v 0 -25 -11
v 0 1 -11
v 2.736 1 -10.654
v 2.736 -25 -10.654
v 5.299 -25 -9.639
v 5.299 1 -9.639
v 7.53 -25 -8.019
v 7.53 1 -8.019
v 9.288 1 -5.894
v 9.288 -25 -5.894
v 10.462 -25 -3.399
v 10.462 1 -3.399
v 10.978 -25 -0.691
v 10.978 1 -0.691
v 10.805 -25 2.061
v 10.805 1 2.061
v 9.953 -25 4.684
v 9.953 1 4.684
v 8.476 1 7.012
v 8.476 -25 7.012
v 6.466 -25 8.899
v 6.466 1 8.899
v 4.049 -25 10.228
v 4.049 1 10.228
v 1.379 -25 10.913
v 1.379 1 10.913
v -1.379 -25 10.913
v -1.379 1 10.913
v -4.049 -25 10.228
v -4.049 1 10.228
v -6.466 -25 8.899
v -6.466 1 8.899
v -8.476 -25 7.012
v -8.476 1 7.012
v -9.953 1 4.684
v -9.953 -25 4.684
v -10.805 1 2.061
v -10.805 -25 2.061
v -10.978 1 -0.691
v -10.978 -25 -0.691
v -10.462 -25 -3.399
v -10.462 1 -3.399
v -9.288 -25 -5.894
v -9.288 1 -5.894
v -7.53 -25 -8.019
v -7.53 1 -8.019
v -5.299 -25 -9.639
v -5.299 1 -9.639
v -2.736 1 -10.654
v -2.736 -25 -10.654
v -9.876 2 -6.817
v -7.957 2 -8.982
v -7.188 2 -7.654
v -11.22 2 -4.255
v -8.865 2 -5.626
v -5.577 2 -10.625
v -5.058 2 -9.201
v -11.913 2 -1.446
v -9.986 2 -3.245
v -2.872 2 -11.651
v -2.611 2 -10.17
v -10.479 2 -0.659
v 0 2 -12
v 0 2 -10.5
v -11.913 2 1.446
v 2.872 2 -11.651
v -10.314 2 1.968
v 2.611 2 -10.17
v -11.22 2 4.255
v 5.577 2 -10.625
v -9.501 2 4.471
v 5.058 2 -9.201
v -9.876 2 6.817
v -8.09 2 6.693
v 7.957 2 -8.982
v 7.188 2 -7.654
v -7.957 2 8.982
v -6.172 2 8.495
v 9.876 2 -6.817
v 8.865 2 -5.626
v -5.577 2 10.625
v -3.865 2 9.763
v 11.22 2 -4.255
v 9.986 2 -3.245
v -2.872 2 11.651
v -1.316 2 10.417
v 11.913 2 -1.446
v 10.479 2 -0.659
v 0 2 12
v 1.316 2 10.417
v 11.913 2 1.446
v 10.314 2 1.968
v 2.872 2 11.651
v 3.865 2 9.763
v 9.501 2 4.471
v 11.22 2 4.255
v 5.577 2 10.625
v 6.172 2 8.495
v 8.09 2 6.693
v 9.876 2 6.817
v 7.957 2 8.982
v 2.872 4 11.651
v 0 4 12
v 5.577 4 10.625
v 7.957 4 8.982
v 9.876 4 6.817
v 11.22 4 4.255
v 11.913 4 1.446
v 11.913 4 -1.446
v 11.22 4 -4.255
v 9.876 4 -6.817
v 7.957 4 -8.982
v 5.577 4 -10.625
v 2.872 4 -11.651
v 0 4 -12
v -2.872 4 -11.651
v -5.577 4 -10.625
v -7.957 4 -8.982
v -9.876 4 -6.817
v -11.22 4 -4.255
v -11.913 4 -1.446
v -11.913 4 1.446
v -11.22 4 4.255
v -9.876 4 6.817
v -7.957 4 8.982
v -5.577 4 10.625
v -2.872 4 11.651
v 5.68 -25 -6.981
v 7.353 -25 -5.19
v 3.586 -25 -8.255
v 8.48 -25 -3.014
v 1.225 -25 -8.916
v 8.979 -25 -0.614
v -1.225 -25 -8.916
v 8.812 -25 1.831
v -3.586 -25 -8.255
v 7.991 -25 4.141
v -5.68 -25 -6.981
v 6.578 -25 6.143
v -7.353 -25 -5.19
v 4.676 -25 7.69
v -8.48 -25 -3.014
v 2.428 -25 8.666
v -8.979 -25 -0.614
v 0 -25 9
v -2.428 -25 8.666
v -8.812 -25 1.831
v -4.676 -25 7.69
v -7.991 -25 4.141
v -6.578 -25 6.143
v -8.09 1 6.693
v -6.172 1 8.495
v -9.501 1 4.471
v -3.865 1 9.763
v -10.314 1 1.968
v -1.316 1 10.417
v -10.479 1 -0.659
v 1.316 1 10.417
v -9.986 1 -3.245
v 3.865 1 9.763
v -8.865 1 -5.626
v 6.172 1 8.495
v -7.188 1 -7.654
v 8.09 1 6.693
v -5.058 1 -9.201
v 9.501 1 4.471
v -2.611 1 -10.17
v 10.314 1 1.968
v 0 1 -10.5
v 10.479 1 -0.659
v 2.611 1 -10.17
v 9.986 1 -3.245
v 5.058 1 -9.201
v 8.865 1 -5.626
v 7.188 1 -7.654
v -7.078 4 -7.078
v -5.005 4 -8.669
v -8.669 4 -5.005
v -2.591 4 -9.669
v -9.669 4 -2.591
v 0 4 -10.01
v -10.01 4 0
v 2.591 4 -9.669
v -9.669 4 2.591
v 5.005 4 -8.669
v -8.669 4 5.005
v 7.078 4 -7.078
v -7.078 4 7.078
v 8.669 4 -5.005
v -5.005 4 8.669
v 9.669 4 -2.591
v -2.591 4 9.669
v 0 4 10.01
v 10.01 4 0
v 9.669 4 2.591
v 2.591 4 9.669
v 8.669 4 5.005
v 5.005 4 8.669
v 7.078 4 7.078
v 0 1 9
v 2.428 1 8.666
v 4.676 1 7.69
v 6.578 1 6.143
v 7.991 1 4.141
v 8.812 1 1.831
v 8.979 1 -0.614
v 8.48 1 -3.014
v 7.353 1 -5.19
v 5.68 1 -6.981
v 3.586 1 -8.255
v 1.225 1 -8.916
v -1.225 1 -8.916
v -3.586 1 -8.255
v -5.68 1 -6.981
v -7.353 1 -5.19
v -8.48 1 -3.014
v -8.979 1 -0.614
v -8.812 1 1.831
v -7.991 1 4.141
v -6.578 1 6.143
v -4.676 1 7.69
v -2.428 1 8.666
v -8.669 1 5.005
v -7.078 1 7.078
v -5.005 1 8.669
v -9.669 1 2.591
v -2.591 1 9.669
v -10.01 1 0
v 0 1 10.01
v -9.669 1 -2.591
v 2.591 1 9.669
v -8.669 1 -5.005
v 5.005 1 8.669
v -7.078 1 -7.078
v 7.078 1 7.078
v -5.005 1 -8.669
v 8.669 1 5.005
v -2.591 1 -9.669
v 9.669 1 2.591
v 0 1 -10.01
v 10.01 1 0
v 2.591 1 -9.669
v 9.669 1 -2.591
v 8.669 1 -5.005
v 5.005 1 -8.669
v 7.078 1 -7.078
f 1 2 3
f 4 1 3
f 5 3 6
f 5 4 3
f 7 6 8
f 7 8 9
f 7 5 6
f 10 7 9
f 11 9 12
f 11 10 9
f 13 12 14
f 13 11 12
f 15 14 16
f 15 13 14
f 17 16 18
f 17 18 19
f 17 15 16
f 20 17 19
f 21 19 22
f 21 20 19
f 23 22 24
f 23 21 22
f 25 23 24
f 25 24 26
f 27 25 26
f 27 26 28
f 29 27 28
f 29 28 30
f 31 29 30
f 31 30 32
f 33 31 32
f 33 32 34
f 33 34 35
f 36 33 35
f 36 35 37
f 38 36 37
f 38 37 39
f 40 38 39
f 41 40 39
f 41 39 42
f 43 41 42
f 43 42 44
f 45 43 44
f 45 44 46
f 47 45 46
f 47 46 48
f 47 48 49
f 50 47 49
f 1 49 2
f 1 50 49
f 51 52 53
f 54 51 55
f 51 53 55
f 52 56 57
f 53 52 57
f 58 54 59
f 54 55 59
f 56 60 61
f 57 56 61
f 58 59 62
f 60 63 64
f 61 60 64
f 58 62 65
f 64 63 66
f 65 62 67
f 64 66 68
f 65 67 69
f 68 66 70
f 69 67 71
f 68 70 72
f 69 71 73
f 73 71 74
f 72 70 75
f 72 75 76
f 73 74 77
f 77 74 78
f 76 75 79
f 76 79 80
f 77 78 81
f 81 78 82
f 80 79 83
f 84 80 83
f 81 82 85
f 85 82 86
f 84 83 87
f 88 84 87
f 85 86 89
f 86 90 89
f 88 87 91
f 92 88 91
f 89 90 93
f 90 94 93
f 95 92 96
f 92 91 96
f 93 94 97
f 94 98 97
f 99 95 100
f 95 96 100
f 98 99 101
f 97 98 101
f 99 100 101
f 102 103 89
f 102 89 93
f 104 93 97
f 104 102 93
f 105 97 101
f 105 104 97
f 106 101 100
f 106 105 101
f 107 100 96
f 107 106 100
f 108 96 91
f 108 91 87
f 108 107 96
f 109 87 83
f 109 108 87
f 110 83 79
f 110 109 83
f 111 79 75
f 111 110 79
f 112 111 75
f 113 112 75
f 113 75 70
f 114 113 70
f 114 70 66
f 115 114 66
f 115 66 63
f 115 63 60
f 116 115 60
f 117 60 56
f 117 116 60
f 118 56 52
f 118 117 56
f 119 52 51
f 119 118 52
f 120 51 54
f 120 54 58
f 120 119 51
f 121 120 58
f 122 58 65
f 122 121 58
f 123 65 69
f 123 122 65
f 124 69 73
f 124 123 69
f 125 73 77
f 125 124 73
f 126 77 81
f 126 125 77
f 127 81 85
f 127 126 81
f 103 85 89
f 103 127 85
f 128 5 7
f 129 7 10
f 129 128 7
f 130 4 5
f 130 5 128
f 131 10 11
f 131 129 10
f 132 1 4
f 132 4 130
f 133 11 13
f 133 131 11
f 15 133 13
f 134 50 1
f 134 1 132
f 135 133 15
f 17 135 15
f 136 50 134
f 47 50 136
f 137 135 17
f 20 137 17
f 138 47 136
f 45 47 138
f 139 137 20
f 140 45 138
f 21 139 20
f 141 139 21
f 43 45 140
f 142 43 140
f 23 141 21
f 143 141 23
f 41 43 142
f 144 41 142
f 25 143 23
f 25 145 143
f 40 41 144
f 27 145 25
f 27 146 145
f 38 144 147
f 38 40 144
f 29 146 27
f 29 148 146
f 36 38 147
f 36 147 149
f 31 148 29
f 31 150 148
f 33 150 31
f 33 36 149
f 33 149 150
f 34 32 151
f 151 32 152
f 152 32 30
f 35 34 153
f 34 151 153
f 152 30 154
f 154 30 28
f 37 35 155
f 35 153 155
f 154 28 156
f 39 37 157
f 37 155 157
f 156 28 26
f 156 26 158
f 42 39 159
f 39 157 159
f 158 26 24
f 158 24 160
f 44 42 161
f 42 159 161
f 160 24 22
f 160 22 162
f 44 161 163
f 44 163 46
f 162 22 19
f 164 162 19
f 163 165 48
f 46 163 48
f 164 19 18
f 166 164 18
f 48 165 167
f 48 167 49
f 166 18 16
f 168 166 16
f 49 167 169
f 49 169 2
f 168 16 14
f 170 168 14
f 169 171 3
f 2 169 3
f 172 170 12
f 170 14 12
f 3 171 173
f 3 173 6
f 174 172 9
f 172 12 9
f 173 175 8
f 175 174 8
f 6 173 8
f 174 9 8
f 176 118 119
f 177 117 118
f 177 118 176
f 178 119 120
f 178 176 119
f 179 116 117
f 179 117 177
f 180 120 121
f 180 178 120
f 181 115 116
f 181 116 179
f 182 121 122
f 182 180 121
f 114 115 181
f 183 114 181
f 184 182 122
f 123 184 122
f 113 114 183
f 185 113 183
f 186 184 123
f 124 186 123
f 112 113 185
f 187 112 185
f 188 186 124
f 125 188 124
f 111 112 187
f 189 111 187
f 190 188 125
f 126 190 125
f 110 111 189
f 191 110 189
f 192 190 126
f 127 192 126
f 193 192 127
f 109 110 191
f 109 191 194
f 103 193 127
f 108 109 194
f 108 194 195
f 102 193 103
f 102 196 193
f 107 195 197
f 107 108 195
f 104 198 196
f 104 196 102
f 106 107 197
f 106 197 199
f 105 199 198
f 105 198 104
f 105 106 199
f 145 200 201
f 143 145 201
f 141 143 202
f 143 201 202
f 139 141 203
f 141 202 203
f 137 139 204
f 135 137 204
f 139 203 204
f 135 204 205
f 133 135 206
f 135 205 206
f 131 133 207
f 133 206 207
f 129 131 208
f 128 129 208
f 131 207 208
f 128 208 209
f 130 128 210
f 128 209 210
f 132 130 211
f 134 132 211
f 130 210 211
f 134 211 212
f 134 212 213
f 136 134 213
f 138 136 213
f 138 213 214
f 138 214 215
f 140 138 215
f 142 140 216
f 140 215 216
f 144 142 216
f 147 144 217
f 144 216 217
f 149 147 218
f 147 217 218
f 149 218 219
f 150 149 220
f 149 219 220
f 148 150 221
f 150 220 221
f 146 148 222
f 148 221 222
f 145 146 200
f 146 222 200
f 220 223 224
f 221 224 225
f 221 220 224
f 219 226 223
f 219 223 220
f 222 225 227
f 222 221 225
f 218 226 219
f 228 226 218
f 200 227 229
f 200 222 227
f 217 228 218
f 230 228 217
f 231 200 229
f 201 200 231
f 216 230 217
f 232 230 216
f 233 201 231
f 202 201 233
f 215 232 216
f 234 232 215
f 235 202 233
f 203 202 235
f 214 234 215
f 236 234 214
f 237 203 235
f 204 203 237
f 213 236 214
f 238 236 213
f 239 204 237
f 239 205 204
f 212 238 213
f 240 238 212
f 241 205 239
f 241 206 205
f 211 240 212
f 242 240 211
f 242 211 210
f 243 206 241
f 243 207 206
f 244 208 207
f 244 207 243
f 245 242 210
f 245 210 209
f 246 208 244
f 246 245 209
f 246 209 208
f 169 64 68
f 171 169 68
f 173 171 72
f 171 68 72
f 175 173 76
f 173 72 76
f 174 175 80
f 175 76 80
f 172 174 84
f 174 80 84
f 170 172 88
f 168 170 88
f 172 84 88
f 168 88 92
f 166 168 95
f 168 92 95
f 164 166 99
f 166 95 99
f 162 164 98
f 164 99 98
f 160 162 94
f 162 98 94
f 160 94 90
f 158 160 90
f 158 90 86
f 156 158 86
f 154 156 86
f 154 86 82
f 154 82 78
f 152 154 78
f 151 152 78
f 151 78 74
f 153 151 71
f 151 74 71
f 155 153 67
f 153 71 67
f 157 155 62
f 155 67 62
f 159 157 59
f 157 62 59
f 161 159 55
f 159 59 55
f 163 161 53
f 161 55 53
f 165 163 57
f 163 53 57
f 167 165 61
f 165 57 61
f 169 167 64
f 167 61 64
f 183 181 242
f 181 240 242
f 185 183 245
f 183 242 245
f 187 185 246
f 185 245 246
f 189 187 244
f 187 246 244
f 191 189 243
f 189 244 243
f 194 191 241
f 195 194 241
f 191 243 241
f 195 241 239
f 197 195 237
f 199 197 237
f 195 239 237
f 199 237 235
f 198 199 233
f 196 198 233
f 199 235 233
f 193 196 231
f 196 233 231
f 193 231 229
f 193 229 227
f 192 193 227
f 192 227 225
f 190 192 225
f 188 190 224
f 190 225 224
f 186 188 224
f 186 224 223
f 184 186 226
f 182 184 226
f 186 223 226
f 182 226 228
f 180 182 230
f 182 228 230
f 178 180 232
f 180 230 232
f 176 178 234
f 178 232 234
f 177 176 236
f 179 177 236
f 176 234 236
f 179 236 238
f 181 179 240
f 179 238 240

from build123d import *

# Parameters (mm, degrees)
SKETCH_2_R           = 10.01
SKETCH_2_R_2         = 9
EXTRUDE_2_DEPTH      = 25
EXTRUDE_START        = 2
SKETCH_3_R           = 10.01
EXTRUDE_3_DEPTH      = 2
SKETCH_4_R           = 9
CUT_EXTRUDE_1_DEPTH  = 1
SKETCH_6_R           = 8
CUT_EXTRUDE_3_DEPTH  = 3
SKETCH_7_R           = 11
SKETCH_7_R_2         = 10
EXTRUDE_4_DEPTH      = 4
SKETCH_8_R           = 9
SKETCH_8_R_2         = 8
EXTRUDE_5_DEPTH      = 25
SKETCH_10_R          = 10.01
SKETCH_10_R_2        = 9.5
CUT_EXTRUDE_5_DEPTH  = 1
CUT_EXTRUDE_START    = 10
SKETCH_11_R          = 10.01
CUT_EXTRUDE_6_DEPTH  = 10
SKETCH_12_R          = 11
SKETCH_12_R_2        = 10.01
EXTRUDE_6_DEPTH      = 26
SKETCH_13_R          = 9
CUT_EXTRUDE_7_DEPTH  = 26
SKETCH_14_R          = 10.005206388
SKETCH_14_R_2        = 9.5
EXTRUDE_7_DEPTH      = 26
SKETCH_16_R          = 11
SKETCH_16_R_2        = 10.5
CUT_EXTRUDE_12_DEPTH = 1
SKETCH_17_R          = 13.732639959
CUT_EXTRUDE_13_DEPTH = 1
SKETCH_19_R          = 10.229377856
SKETCH_19_R_2        = 10.005206388
EXTRUDE_10_DEPTH     = 10
SKETCH_20_R          = 12
SKETCH_20_R_2        = 11
EXTRUDE_11_DEPTH     = 2


with BuildPart() as part:
    # Эскиз2 → Бобышка-Вытянуть2 (new body)
    with BuildSketch(Plane.XZ):
        with Locations(Location((0, 0, 0), (0, 0, 270))):
            Circle(SKETCH_2_R)
        with Locations(Location((0, 0, 0), (0, 0, 270))):
            Circle(SKETCH_2_R_2, mode=Mode.SUBTRACT)
    extrude(amount=EXTRUDE_2_DEPTH)

    # Эскиз3 → Бобышка-Вытянуть3 (add)
    with BuildSketch(Plane(origin=(0, 0, 0), x_dir=(1, 0, 0), z_dir=(0, 1, 0)).offset(EXTRUDE_START)):
        with Locations(Location((0, 0, 0), (0, 0, 270))):
            Circle(SKETCH_3_R)
    extrude(amount=-EXTRUDE_3_DEPTH)

    # Эскиз4 → Вырез-Вытянуть1 (cut)
    with BuildSketch(Plane(origin=(0, 2, 0), x_dir=(1, 0, 0), z_dir=(0, 1, 0))):
        with Locations(Location((0, 0, 0), (0, 0, 90))):
            Circle(SKETCH_4_R)
    extrude(amount=-CUT_EXTRUDE_1_DEPTH, mode=Mode.SUBTRACT)

    # Эскиз6 → Вырез-Вытянуть3 (cut)
    with BuildSketch(Plane(origin=(0, 1, 0), x_dir=(1, 0, 0), z_dir=(0, 1, 0))):
        with Locations(Location((0, 0, 0), (0, 0, 270))):
            Circle(SKETCH_6_R)
    extrude(amount=-CUT_EXTRUDE_3_DEPTH, mode=Mode.SUBTRACT)

    # Эскиз7 → Бобышка-Вытянуть4 (add)
    with BuildSketch(Plane(origin=(0, 1, 0), x_dir=(1, 0, 0), z_dir=(0, 1, 0))):
        with Locations(Location((0, 0, 0), (0, 0, 270))):
            Circle(SKETCH_7_R)
        with Locations(Location((0, 0, 0), (0, 0, 270))):
            Circle(SKETCH_7_R_2, mode=Mode.SUBTRACT)
    extrude(amount=EXTRUDE_4_DEPTH)

    # Эскиз8 → Бобышка-Вытянуть5 (add)
    with BuildSketch(Plane.XZ):
        with Locations(Location((0, 0, 0), (0, 0, 90))):
            Circle(SKETCH_8_R)
        with Locations(Location((0, 0, 0), (0, 0, 90))):
            Circle(SKETCH_8_R_2, mode=Mode.SUBTRACT)
    extrude(amount=EXTRUDE_5_DEPTH)

    # Эскиз10 → Вырез-Вытянуть5 (cut)
    with BuildSketch(Plane.XZ.offset(-1)):
        with Locations(Location((0, 0, 0), (0, 0, 270))):
            Circle(SKETCH_10_R)
        with Locations(Location((0, 0, 0), (0, 0, 270))):
            Circle(SKETCH_10_R_2, mode=Mode.SUBTRACT)
    extrude(amount=CUT_EXTRUDE_5_DEPTH, mode=Mode.SUBTRACT)

    # Эскиз11 → Вырез-Вытянуть6 (cut)
    with BuildSketch(Plane(origin=(0, 1, 0), x_dir=(1, 0, 0), z_dir=(0, 1, 0)).offset(CUT_EXTRUDE_START)):
        with Locations(Location((0, 0, 0), (0, 0, 90))):
            Circle(SKETCH_11_R)
    extrude(amount=-CUT_EXTRUDE_6_DEPTH, mode=Mode.SUBTRACT)


with BuildPart() as cut_extrude_6_piece_1:
    # of the separate pieces the step leaves, piece 1, a body of its own (cut_extrude_6_pieces)
    add(part.part.solids().sort_by_distance((0, 0, -10.01))[0])



with BuildPart() as cut_extrude_6_piece_2:
    # of the separate pieces the step leaves, piece 2, a body of its own (cut_extrude_6_pieces)
    add(part.part.solids().sort_by_distance((0, 1, 11))[0])


with BuildPart() as cut_extrude_6_piece_1_1:
    add(cut_extrude_6_piece_1.part)

    add(cut_extrude_6_piece_2.part)  # Бобышка-Вытянуть6 merges Вырез-Вытянуть6 piece 2
    # Эскиз12 → Бобышка-Вытянуть6 (add)
    with BuildSketch(Plane.XZ.offset(25)):
        with Locations(Location((0, 0, 0), (0, 0, 270))):
            Circle(SKETCH_12_R)
        with Locations(Location((0, 0, 0), (0, 0, 270))):
            Circle(SKETCH_12_R_2, mode=Mode.SUBTRACT)
    extrude(amount=-EXTRUDE_6_DEPTH)

    # Эскиз13 → Вырез-Вытянуть7 (cut)
    with BuildSketch(Plane(origin=(0, 1, 0), x_dir=(1, 0, 0), z_dir=(0, 1, 0))):
        with Locations(Location((0, 0, 0), (0, 0, 270))):
            Circle(SKETCH_13_R)
    extrude(amount=-CUT_EXTRUDE_7_DEPTH, mode=Mode.SUBTRACT)

    # Эскиз14 → Бобышка-Вытянуть7 (add)
    with BuildSketch(Plane(origin=(0, 1, 0), x_dir=(1, 0, 0), z_dir=(0, 1, 0))):
        with Locations(Location((0, 0, 0), (0, 0, 270))):
            Circle(SKETCH_14_R)
        Circle(SKETCH_14_R_2, mode=Mode.SUBTRACT)
    extrude(amount=-EXTRUDE_7_DEPTH)

    # Эскиз16 → Вырез-Вытянуть12 (cut)
    with BuildSketch(Plane.XZ.offset(-2)):
        with Locations(Location((0, 0, 0), (0, 0, 270))):
            Circle(SKETCH_16_R)
        with Locations(Location((0, 0, 0), (0, 0, 270))):
            Circle(SKETCH_16_R_2, mode=Mode.SUBTRACT)
    extrude(amount=CUT_EXTRUDE_12_DEPTH, mode=Mode.SUBTRACT)

    # Эскиз17 → Вырез-Вытянуть13 (cut)
    with BuildSketch(Plane(origin=(0, 5, 0), x_dir=(1, 0, 0), z_dir=(0, 1, 0))):
        Circle(SKETCH_17_R)
    extrude(amount=-CUT_EXTRUDE_13_DEPTH, mode=Mode.SUBTRACT)

    # Эскиз19 → Бобышка-Вытянуть10 (add)
    with BuildSketch(Plane(origin=(0, 1, 0), x_dir=(1, 0, 0), z_dir=(0, 1, 0))):
        Circle(SKETCH_19_R)
        Circle(SKETCH_19_R_2, mode=Mode.SUBTRACT)
    extrude(amount=-EXTRUDE_10_DEPTH)

    # Эскиз20 → Бобышка-Вытянуть11 (add)
    with BuildSketch(Plane(origin=(0, 4, 0), x_dir=(1, 0, 0), z_dir=(0, 1, 0))):
        with Locations(Location((0, 0, 0), (0, 0, 270))):
            Circle(SKETCH_20_R)
        with Locations(Location((0, 0, 0), (0, 0, 90))):
            Circle(SKETCH_20_R_2, mode=Mode.SUBTRACT)
    extrude(amount=-EXTRUDE_11_DEPTH)


solid = cut_extrude_6_piece_1_1.part
